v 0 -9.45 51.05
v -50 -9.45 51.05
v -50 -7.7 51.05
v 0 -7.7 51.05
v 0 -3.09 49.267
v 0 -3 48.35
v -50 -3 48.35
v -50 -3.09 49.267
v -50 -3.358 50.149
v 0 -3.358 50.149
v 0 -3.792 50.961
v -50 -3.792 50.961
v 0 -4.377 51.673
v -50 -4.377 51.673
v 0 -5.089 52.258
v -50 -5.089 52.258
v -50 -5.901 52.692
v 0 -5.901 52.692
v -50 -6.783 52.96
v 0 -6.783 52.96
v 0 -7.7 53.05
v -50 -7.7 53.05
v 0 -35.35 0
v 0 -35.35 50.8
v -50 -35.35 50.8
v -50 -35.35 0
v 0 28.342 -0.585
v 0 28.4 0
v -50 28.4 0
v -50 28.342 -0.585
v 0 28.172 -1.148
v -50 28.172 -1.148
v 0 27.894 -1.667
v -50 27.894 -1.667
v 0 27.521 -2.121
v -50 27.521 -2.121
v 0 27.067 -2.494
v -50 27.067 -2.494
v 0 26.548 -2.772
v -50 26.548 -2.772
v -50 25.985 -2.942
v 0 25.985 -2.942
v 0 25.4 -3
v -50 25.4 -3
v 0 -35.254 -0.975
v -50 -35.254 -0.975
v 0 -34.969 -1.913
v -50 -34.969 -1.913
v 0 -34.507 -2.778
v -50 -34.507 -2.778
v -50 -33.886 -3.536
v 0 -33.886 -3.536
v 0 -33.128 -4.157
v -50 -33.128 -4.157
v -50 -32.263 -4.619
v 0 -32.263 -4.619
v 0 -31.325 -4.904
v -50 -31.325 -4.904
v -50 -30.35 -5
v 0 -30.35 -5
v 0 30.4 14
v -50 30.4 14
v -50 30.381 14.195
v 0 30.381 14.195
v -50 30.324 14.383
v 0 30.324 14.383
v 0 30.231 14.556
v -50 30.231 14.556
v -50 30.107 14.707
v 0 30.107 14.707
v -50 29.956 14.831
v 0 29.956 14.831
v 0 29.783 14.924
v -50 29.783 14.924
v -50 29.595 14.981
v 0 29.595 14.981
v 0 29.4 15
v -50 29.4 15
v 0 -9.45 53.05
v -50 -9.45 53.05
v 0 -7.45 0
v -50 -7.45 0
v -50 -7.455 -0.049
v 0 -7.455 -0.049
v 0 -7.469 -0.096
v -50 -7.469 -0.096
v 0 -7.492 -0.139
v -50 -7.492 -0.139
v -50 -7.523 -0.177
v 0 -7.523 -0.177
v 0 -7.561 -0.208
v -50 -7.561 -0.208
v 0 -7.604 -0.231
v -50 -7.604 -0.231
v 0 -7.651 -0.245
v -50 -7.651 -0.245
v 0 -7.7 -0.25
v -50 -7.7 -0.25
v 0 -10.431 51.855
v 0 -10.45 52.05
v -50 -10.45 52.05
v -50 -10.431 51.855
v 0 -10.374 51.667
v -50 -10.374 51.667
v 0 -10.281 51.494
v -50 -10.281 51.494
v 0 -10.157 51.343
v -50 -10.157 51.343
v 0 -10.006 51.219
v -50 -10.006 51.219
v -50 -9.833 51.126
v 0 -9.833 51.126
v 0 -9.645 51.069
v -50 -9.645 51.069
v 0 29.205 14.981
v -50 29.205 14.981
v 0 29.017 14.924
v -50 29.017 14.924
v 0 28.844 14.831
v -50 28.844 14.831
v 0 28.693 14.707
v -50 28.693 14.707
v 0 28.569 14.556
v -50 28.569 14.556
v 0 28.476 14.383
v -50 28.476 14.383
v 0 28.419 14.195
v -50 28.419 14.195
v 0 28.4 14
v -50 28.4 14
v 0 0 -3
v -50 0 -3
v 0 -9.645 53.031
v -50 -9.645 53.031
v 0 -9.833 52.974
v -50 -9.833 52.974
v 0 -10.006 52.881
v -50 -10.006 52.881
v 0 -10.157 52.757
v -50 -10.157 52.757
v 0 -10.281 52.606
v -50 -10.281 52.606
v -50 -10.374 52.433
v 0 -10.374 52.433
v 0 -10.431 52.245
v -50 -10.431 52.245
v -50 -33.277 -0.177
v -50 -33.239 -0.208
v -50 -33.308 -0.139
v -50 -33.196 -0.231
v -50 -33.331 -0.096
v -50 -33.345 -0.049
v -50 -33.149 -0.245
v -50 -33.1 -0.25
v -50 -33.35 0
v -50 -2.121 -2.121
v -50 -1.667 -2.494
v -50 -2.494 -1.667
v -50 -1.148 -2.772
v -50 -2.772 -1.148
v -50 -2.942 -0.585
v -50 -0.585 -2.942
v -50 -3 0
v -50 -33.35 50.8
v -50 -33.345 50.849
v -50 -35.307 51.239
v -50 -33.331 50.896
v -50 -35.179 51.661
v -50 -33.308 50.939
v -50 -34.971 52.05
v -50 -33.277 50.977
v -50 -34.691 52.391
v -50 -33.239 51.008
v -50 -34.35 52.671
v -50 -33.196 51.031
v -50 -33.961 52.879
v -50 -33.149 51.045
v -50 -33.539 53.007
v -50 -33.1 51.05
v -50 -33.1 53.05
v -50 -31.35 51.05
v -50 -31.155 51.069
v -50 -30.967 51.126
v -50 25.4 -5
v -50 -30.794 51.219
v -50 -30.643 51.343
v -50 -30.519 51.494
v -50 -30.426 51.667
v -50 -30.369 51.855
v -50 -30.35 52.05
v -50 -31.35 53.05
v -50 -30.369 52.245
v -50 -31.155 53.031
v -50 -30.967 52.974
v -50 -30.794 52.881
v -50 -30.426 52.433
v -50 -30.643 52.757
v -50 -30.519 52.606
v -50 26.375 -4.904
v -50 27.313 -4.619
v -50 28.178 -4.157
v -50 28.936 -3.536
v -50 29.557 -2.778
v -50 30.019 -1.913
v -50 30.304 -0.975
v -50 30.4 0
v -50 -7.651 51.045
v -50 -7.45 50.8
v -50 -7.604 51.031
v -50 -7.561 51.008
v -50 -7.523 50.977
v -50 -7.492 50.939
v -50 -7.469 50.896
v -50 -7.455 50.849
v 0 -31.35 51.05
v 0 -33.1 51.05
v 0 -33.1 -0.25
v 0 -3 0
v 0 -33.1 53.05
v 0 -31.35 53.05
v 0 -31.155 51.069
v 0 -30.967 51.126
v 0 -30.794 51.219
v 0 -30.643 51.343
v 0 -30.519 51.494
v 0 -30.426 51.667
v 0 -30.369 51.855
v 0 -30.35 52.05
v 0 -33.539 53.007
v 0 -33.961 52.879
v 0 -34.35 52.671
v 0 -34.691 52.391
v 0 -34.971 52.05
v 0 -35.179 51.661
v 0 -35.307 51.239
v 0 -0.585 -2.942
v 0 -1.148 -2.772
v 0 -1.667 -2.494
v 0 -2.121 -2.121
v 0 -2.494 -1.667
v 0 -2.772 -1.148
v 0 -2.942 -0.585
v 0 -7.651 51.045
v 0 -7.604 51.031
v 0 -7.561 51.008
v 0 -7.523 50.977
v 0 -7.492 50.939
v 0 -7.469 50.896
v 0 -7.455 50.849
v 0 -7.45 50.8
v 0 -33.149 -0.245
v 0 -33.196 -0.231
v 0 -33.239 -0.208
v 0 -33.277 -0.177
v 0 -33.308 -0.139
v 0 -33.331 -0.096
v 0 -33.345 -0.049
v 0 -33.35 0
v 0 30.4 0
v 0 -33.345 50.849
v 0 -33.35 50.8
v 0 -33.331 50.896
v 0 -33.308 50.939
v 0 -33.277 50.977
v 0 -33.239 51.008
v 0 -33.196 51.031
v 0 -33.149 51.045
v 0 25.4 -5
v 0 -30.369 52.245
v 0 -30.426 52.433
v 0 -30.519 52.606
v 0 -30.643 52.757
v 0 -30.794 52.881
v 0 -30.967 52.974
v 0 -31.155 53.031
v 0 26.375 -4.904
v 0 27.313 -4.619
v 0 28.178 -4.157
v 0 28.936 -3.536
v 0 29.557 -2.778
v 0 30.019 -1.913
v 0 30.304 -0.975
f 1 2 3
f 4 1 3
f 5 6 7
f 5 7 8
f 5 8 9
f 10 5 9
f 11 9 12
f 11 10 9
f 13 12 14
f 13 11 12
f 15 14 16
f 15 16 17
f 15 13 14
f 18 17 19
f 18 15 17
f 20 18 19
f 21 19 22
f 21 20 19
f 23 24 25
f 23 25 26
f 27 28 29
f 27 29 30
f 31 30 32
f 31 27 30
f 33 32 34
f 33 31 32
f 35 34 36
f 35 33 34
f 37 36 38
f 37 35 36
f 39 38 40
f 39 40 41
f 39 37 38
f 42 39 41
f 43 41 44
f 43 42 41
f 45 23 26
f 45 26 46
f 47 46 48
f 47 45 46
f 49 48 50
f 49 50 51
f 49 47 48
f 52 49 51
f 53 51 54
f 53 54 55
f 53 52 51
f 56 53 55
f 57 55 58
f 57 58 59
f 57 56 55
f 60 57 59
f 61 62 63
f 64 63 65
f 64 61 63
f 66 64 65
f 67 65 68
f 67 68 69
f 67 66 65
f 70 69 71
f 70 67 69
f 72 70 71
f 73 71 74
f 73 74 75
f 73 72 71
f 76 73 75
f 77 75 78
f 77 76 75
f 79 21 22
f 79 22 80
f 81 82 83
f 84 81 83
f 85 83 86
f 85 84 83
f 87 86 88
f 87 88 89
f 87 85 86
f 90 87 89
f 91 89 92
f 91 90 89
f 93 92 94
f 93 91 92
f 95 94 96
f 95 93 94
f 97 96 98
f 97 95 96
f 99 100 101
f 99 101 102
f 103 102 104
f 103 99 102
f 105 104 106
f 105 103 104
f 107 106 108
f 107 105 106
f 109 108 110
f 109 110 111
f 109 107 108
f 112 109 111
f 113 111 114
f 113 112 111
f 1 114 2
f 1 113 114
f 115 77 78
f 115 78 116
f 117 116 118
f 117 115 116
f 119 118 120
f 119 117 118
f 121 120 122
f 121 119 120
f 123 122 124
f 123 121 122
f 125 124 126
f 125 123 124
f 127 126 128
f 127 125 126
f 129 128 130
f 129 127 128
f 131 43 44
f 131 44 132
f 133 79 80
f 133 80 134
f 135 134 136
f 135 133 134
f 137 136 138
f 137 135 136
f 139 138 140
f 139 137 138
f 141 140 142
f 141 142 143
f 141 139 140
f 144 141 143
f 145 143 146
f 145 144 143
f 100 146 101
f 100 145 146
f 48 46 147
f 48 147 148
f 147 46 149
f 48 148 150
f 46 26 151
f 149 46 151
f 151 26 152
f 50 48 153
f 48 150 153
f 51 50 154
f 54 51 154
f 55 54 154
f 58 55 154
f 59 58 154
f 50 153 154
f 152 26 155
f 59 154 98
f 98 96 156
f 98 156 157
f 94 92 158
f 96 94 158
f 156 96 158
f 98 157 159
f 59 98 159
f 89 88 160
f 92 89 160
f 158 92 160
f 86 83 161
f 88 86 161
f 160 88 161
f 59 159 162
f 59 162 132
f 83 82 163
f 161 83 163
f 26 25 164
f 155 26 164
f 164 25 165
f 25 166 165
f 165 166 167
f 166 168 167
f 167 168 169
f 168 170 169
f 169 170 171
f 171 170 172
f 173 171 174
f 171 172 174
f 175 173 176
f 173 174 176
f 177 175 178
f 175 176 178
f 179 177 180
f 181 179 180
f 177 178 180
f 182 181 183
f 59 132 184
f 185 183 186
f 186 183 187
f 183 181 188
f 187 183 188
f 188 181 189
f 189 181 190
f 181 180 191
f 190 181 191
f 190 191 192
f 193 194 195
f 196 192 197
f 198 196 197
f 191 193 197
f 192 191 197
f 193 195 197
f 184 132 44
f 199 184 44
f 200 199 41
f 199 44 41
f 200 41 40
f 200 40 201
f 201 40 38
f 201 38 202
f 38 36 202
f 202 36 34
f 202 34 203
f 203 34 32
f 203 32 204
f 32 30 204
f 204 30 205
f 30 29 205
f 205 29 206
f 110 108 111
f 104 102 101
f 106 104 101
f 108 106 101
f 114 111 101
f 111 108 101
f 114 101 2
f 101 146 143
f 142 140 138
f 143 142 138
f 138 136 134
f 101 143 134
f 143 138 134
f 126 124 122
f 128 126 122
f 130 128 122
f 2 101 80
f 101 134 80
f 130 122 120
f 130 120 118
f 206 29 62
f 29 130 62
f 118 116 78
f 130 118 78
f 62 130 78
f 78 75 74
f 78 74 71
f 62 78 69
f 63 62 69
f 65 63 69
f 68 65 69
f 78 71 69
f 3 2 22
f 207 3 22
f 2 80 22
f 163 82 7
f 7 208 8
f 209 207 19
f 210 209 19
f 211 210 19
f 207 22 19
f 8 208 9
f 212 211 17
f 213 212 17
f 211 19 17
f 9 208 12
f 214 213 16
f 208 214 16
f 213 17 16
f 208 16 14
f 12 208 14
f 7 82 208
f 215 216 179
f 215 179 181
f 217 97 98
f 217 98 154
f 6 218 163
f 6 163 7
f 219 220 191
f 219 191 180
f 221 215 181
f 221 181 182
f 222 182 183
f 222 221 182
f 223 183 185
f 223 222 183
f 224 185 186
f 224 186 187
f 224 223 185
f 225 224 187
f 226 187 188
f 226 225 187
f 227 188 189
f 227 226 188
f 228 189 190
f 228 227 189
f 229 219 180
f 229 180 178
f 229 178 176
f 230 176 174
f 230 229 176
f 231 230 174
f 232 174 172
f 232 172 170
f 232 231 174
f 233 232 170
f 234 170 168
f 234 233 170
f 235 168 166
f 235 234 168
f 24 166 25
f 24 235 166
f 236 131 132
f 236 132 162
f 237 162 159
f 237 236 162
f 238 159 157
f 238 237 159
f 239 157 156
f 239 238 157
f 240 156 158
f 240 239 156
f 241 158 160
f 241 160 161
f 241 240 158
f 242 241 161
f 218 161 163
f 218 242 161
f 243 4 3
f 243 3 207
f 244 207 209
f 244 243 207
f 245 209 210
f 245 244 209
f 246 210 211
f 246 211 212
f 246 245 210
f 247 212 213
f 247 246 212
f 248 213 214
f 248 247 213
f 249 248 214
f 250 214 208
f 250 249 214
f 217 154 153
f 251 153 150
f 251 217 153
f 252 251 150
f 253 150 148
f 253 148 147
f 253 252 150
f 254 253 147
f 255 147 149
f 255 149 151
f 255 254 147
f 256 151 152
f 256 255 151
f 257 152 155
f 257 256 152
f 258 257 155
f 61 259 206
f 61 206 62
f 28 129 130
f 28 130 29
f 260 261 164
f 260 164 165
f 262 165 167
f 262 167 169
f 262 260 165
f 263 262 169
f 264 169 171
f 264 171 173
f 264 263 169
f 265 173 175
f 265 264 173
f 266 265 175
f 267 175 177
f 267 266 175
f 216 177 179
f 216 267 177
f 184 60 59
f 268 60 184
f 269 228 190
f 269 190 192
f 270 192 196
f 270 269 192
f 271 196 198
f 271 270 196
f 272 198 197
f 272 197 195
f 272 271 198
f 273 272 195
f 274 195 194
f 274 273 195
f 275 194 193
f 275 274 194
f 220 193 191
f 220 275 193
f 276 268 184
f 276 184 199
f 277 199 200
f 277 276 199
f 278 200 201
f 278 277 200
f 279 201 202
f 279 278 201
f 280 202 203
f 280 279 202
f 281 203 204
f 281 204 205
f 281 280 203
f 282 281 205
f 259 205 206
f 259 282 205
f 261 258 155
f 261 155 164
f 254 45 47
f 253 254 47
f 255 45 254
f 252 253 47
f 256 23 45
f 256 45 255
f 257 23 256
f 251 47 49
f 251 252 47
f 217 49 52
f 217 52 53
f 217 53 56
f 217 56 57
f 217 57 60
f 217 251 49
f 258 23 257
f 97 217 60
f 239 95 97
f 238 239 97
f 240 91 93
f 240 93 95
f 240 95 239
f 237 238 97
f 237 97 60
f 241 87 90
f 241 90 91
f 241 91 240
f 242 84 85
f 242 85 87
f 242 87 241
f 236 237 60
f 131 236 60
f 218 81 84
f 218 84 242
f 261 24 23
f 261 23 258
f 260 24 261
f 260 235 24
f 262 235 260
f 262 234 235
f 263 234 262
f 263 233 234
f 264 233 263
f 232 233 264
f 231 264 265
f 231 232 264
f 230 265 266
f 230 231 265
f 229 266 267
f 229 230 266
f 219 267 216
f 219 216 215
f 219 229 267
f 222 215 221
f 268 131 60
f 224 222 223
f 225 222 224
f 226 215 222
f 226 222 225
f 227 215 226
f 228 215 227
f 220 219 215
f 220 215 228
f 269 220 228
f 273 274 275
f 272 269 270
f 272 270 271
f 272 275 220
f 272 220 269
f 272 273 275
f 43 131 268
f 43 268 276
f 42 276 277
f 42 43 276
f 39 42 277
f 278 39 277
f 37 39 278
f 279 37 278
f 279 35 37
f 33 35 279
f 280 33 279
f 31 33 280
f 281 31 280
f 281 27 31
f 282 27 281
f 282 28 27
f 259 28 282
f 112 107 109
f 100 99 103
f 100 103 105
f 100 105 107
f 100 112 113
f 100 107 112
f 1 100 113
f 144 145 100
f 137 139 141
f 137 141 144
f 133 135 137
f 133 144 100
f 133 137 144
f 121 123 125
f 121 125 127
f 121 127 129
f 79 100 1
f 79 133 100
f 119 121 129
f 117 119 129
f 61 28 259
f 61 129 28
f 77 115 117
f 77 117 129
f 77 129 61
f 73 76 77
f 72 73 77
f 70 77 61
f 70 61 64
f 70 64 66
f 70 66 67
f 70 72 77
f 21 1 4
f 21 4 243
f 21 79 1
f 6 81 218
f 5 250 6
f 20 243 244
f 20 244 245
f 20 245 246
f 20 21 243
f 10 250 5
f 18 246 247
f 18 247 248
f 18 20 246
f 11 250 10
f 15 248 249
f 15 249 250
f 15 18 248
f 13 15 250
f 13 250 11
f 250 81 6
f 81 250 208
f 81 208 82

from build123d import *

# Parameters (mm, degrees)
F1_DEPTH = 50


with BuildPart() as f1:
    # F0 (on Right) → F1 (new body)
    with BuildSketch(Plane.YZ):
        with BuildLine():
            Line((-33.1, -0.25), (-33.35, -0.25))
            Line((-33.35, -0.25), (-33.35, 0))
            Line((-33.35, 0), (-33.35, 50.8))
            Line((-33.35, 50.8), (-33.35, 51.05))
            Line((-33.35, 51.05), (-33.1, 51.05))
            Line((-33.1, 51.05), (-31.35, 51.05))
            ThreePointArc((-31.35, 51.05), (-30.642893, 51.342893), (-30.35, 52.05))
            ThreePointArc((-30.35, 52.05), (-30.642893, 52.757107), (-31.35, 53.05))
            Line((-31.35, 53.05), (-33.1, 53.05))
            ThreePointArc((-33.1, 53.05), (-34.69099, 52.39099), (-35.35, 50.8))
            Line((-35.35, 50.8), (-35.35, 0))
            ThreePointArc((-35.35, 0), (-33.885534, -3.535534), (-30.35, -5))
            Line((-30.35, -5), (25.4, -5))
            ThreePointArc((25.4, -5), (28.935534, -3.535534), (30.4, 0))
            Line((30.4, 0), (30.4, 14))
            ThreePointArc((30.4, 14), (30.107107, 14.707107), (29.4, 15))
            ThreePointArc((29.4, 15), (28.692893, 14.707107), (28.4, 14))
            Line((28.4, 14), (28.4, 0))
            Line((28.4, 0), (28.4, -3))
            Line((28.4, -3), (25.4, -3))
            Line((25.4, -3), (0, -3))
            Line((0, -3), (-3, -3))
            Line((-3, -3), (-3, 0))
            Line((-3, 0), (-3, 48.35))
            ThreePointArc((-3, 48.35), (-4.376598, 51.673402), (-7.7, 53.05))
            Line((-7.7, 53.05), (-9.45, 53.05))
            ThreePointArc((-9.45, 53.05), (-10.157107, 52.757107), (-10.45, 52.05))
            ThreePointArc((-10.45, 52.05), (-10.157107, 51.342893), (-9.45, 51.05))
            Line((-9.45, 51.05), (-7.7, 51.05))
            Line((-7.7, 51.05), (-7.45, 51.05))
            Line((-7.45, 51.05), (-7.45, 50.8))
            Line((-7.45, 50.8), (-7.45, 0))
            Line((-7.45, 0), (-7.45, -0.25))
            Line((-7.45, -0.25), (-7.7, -0.25))
            Line((-7.7, -0.25), (-33.1, -0.25))
        make_face()
        with BuildLine():
            Line((-33.35, 51.05), (-33.35, 50.8))
            ThreePointArc((-33.35, 50.8), (-33.276777, 50.976777), (-33.1, 51.05))
            Line((-33.1, 51.05), (-33.35, 51.05))
        make_face()
        with BuildLine():
            ThreePointArc((-7.7, 51.05), (-7.523223, 50.976777), (-7.45, 50.8))
            Line((-7.45, 50.8), (-7.45, 51.05))
            Line((-7.45, 51.05), (-7.7, 51.05))
        make_face()
        with BuildLine():
            ThreePointArc((0, -3), (-2.12132, -2.12132), (-3, 0))
            Line((-3, 0), (-3, -3))
            Line((-3, -3), (0, -3))
        make_face()
        with BuildLine():
            ThreePointArc((-7.45, 0), (-7.523223, -0.176777), (-7.7, -0.25))
            Line((-7.7, -0.25), (-7.45, -0.25))
            Line((-7.45, -0.25), (-7.45, 0))
        make_face()
        with BuildLine():
            Line((-33.35, 0), (-33.35, -0.25))
            Line((-33.35, -0.25), (-33.1, -0.25))
            ThreePointArc((-33.1, -0.25), (-33.276777, -0.176777), (-33.35, 0))
        make_face()
        with BuildLine():
            ThreePointArc((28.4, 0), (27.52132, -2.12132), (25.4, -3))
            Line((25.4, -3), (28.4, -3))
            Line((28.4, -3), (28.4, 0))
        make_face()
    extrude(amount=-F1_DEPTH)


solid = f1.part
